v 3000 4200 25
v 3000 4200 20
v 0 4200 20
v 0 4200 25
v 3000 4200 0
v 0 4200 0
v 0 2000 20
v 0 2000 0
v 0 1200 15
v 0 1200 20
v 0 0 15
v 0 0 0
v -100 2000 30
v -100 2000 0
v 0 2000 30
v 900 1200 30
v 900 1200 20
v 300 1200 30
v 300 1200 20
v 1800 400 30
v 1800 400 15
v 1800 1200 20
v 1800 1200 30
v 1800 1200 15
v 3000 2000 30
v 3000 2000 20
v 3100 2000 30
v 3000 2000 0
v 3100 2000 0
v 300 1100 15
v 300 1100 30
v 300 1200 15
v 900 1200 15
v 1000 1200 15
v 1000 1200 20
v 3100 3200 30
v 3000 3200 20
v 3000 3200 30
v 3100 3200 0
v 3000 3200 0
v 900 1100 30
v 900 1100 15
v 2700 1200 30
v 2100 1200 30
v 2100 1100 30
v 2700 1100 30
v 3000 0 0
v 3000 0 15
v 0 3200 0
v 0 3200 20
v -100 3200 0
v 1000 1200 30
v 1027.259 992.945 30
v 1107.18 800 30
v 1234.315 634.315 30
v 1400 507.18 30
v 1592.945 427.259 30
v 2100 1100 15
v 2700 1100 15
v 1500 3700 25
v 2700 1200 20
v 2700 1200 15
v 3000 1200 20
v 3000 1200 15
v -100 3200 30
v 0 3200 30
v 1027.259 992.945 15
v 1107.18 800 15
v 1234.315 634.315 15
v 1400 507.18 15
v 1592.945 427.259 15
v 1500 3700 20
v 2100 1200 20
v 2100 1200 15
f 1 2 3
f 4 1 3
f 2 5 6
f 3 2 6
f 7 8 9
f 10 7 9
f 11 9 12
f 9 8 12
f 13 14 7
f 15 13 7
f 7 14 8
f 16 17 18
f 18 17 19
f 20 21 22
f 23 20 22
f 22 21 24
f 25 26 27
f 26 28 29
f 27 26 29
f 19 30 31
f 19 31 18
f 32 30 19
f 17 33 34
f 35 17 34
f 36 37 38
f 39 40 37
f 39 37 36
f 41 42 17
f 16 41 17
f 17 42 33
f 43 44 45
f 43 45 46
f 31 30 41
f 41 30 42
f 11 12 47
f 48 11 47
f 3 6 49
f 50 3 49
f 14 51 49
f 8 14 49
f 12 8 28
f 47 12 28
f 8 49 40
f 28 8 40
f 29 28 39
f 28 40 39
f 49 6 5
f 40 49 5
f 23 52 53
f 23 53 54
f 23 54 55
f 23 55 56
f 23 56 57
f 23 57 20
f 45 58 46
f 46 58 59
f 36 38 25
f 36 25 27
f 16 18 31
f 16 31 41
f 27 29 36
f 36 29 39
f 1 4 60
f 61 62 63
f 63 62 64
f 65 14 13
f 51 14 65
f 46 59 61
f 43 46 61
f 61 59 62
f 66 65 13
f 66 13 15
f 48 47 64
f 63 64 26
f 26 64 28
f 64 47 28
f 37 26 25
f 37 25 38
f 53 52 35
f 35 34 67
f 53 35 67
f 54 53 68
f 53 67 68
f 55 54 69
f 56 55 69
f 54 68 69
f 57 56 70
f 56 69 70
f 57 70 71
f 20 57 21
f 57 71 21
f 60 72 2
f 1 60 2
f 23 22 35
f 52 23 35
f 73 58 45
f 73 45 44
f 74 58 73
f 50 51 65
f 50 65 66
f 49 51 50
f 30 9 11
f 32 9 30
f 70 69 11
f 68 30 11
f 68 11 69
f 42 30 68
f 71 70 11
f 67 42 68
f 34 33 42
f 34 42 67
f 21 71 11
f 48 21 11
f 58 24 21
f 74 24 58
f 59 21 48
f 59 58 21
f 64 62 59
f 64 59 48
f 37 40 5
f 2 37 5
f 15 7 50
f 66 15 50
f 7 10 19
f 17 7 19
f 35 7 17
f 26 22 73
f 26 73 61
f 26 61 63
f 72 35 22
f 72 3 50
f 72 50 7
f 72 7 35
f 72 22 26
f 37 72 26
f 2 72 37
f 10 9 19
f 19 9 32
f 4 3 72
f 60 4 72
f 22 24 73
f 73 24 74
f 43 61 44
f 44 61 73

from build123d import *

# Parameters (mm, degrees)
F1_DEPTH = 25
F0_W     = 100
F0_H     = 1200
F2_DEPTH = 30
F0_W_2   = 600
F0_H_2   = 100
F3_DEPTH = 30
F4_DEPTH = 15
F5_DEPTH = 20


# Not quite as in the source:
# - a feature names something its author has since deleted; it is built from what else it names


with BuildPart() as f1:
    # F0 (on Top) → F1 (new body)
    with BuildSketch(Plane.XY):
        Polygon((3000, 4200), (0, 4200), (1500, 3700), align=None)
    extrude(amount=F1_DEPTH)



with BuildPart() as f2:
    # F0 (on Top) → F2 (new body)
    with BuildSketch(Plane.XY):
        with Locations((-50, 2600)):
            Rectangle(F0_W, F0_H)
    extrude(amount=F2_DEPTH)


with BuildPart() as f2b:
    # F0 (on Top) → F2, piece 2 (new body)
    with BuildSketch(Plane.XY):
        with Locations((3050, 2600)):
            Rectangle(F0_W, F0_H)
    extrude(amount=F2_DEPTH)


with BuildPart() as f2c:
    # F0 (on Top) → F2, piece 3 (new body)
    with BuildSketch(Plane.XY):
        with Locations((2400, 1150)):
            Rectangle(F0_W_2, F0_H_2)
    extrude(amount=F2_DEPTH)



with BuildPart() as f2d:
    # F0 (on Top) → F2, piece 4 (new body)
    with BuildSketch(Plane.XY):
        with Locations((600, 1150)):
            Rectangle(F0_W_2, F0_H_2)
    extrude(amount=F2_DEPTH)


with BuildPart() as f3:
    # F0 (on Top) → F3 (new body)
    with BuildSketch(Plane.XY):
        with BuildLine():
            Line((1800, 1200), (1000, 1200))
            ThreePointArc((1000, 1200), (1234.3145750508, 634.3145750508), (1800, 400))
            Line((1800, 400), (1800, 1200))
        make_face()
    extrude(amount=F3_DEPTH)


with BuildPart() as f2c_1:
    add(f2c.part)

    add(f2d.part)  # F4 merges F2d

    add(f3.part)  # F4 merges F3
    # F0 (on Top) → F4 (join)
    with BuildSketch(Plane.XY):
        with BuildLine():
            Line((0, 1200), (0, 0))
            Line((0, 0), (3000, 0))
            Line((3000, 0), (3000, 1200))
            Line((3000, 1200), (2700, 1200))
            Line((2700, 1200), (2700, 1100))
            Line((2700, 1100), (2100, 1100))
            Line((2100, 1100), (2100, 1200))
            Line((2100, 1200), (1800, 1200))
            Line((1800, 1200), (1800, 400))
            ThreePointArc((1800, 400), (1234.3145750508, 634.3145750508), (1000, 1200))
            Line((1000, 1200), (900, 1200))
            Line((900, 1200), (900, 1100))
            Line((900, 1100), (300, 1100))
            Line((300, 1100), (300, 1200))
            Line((300, 1200), (0, 1200))
        make_face()
    extrude(amount=F4_DEPTH)


with BuildPart() as f1_1:
    add(f1.part)

    add(f2.part)  # F5 merges F2

    add(f2b.part)  # F5 merges F2b

    add(f2c_1.part)  # F5 merges F2c
    # F0 (on Top) → F5 (join)
    with BuildSketch(Plane.XY):
        Polygon((0, 2000), (0, 1200), (300, 1200), (900, 1200), (1000, 1200), (1800, 1200), (2100, 1200), (2700, 1200), (3000, 1200), (3000, 2000), (3000, 3200), (3000, 4200), (1500, 3700), (0, 4200), (0, 3200), align=None)
    extrude(amount=F5_DEPTH)


solid = f1_1.part
